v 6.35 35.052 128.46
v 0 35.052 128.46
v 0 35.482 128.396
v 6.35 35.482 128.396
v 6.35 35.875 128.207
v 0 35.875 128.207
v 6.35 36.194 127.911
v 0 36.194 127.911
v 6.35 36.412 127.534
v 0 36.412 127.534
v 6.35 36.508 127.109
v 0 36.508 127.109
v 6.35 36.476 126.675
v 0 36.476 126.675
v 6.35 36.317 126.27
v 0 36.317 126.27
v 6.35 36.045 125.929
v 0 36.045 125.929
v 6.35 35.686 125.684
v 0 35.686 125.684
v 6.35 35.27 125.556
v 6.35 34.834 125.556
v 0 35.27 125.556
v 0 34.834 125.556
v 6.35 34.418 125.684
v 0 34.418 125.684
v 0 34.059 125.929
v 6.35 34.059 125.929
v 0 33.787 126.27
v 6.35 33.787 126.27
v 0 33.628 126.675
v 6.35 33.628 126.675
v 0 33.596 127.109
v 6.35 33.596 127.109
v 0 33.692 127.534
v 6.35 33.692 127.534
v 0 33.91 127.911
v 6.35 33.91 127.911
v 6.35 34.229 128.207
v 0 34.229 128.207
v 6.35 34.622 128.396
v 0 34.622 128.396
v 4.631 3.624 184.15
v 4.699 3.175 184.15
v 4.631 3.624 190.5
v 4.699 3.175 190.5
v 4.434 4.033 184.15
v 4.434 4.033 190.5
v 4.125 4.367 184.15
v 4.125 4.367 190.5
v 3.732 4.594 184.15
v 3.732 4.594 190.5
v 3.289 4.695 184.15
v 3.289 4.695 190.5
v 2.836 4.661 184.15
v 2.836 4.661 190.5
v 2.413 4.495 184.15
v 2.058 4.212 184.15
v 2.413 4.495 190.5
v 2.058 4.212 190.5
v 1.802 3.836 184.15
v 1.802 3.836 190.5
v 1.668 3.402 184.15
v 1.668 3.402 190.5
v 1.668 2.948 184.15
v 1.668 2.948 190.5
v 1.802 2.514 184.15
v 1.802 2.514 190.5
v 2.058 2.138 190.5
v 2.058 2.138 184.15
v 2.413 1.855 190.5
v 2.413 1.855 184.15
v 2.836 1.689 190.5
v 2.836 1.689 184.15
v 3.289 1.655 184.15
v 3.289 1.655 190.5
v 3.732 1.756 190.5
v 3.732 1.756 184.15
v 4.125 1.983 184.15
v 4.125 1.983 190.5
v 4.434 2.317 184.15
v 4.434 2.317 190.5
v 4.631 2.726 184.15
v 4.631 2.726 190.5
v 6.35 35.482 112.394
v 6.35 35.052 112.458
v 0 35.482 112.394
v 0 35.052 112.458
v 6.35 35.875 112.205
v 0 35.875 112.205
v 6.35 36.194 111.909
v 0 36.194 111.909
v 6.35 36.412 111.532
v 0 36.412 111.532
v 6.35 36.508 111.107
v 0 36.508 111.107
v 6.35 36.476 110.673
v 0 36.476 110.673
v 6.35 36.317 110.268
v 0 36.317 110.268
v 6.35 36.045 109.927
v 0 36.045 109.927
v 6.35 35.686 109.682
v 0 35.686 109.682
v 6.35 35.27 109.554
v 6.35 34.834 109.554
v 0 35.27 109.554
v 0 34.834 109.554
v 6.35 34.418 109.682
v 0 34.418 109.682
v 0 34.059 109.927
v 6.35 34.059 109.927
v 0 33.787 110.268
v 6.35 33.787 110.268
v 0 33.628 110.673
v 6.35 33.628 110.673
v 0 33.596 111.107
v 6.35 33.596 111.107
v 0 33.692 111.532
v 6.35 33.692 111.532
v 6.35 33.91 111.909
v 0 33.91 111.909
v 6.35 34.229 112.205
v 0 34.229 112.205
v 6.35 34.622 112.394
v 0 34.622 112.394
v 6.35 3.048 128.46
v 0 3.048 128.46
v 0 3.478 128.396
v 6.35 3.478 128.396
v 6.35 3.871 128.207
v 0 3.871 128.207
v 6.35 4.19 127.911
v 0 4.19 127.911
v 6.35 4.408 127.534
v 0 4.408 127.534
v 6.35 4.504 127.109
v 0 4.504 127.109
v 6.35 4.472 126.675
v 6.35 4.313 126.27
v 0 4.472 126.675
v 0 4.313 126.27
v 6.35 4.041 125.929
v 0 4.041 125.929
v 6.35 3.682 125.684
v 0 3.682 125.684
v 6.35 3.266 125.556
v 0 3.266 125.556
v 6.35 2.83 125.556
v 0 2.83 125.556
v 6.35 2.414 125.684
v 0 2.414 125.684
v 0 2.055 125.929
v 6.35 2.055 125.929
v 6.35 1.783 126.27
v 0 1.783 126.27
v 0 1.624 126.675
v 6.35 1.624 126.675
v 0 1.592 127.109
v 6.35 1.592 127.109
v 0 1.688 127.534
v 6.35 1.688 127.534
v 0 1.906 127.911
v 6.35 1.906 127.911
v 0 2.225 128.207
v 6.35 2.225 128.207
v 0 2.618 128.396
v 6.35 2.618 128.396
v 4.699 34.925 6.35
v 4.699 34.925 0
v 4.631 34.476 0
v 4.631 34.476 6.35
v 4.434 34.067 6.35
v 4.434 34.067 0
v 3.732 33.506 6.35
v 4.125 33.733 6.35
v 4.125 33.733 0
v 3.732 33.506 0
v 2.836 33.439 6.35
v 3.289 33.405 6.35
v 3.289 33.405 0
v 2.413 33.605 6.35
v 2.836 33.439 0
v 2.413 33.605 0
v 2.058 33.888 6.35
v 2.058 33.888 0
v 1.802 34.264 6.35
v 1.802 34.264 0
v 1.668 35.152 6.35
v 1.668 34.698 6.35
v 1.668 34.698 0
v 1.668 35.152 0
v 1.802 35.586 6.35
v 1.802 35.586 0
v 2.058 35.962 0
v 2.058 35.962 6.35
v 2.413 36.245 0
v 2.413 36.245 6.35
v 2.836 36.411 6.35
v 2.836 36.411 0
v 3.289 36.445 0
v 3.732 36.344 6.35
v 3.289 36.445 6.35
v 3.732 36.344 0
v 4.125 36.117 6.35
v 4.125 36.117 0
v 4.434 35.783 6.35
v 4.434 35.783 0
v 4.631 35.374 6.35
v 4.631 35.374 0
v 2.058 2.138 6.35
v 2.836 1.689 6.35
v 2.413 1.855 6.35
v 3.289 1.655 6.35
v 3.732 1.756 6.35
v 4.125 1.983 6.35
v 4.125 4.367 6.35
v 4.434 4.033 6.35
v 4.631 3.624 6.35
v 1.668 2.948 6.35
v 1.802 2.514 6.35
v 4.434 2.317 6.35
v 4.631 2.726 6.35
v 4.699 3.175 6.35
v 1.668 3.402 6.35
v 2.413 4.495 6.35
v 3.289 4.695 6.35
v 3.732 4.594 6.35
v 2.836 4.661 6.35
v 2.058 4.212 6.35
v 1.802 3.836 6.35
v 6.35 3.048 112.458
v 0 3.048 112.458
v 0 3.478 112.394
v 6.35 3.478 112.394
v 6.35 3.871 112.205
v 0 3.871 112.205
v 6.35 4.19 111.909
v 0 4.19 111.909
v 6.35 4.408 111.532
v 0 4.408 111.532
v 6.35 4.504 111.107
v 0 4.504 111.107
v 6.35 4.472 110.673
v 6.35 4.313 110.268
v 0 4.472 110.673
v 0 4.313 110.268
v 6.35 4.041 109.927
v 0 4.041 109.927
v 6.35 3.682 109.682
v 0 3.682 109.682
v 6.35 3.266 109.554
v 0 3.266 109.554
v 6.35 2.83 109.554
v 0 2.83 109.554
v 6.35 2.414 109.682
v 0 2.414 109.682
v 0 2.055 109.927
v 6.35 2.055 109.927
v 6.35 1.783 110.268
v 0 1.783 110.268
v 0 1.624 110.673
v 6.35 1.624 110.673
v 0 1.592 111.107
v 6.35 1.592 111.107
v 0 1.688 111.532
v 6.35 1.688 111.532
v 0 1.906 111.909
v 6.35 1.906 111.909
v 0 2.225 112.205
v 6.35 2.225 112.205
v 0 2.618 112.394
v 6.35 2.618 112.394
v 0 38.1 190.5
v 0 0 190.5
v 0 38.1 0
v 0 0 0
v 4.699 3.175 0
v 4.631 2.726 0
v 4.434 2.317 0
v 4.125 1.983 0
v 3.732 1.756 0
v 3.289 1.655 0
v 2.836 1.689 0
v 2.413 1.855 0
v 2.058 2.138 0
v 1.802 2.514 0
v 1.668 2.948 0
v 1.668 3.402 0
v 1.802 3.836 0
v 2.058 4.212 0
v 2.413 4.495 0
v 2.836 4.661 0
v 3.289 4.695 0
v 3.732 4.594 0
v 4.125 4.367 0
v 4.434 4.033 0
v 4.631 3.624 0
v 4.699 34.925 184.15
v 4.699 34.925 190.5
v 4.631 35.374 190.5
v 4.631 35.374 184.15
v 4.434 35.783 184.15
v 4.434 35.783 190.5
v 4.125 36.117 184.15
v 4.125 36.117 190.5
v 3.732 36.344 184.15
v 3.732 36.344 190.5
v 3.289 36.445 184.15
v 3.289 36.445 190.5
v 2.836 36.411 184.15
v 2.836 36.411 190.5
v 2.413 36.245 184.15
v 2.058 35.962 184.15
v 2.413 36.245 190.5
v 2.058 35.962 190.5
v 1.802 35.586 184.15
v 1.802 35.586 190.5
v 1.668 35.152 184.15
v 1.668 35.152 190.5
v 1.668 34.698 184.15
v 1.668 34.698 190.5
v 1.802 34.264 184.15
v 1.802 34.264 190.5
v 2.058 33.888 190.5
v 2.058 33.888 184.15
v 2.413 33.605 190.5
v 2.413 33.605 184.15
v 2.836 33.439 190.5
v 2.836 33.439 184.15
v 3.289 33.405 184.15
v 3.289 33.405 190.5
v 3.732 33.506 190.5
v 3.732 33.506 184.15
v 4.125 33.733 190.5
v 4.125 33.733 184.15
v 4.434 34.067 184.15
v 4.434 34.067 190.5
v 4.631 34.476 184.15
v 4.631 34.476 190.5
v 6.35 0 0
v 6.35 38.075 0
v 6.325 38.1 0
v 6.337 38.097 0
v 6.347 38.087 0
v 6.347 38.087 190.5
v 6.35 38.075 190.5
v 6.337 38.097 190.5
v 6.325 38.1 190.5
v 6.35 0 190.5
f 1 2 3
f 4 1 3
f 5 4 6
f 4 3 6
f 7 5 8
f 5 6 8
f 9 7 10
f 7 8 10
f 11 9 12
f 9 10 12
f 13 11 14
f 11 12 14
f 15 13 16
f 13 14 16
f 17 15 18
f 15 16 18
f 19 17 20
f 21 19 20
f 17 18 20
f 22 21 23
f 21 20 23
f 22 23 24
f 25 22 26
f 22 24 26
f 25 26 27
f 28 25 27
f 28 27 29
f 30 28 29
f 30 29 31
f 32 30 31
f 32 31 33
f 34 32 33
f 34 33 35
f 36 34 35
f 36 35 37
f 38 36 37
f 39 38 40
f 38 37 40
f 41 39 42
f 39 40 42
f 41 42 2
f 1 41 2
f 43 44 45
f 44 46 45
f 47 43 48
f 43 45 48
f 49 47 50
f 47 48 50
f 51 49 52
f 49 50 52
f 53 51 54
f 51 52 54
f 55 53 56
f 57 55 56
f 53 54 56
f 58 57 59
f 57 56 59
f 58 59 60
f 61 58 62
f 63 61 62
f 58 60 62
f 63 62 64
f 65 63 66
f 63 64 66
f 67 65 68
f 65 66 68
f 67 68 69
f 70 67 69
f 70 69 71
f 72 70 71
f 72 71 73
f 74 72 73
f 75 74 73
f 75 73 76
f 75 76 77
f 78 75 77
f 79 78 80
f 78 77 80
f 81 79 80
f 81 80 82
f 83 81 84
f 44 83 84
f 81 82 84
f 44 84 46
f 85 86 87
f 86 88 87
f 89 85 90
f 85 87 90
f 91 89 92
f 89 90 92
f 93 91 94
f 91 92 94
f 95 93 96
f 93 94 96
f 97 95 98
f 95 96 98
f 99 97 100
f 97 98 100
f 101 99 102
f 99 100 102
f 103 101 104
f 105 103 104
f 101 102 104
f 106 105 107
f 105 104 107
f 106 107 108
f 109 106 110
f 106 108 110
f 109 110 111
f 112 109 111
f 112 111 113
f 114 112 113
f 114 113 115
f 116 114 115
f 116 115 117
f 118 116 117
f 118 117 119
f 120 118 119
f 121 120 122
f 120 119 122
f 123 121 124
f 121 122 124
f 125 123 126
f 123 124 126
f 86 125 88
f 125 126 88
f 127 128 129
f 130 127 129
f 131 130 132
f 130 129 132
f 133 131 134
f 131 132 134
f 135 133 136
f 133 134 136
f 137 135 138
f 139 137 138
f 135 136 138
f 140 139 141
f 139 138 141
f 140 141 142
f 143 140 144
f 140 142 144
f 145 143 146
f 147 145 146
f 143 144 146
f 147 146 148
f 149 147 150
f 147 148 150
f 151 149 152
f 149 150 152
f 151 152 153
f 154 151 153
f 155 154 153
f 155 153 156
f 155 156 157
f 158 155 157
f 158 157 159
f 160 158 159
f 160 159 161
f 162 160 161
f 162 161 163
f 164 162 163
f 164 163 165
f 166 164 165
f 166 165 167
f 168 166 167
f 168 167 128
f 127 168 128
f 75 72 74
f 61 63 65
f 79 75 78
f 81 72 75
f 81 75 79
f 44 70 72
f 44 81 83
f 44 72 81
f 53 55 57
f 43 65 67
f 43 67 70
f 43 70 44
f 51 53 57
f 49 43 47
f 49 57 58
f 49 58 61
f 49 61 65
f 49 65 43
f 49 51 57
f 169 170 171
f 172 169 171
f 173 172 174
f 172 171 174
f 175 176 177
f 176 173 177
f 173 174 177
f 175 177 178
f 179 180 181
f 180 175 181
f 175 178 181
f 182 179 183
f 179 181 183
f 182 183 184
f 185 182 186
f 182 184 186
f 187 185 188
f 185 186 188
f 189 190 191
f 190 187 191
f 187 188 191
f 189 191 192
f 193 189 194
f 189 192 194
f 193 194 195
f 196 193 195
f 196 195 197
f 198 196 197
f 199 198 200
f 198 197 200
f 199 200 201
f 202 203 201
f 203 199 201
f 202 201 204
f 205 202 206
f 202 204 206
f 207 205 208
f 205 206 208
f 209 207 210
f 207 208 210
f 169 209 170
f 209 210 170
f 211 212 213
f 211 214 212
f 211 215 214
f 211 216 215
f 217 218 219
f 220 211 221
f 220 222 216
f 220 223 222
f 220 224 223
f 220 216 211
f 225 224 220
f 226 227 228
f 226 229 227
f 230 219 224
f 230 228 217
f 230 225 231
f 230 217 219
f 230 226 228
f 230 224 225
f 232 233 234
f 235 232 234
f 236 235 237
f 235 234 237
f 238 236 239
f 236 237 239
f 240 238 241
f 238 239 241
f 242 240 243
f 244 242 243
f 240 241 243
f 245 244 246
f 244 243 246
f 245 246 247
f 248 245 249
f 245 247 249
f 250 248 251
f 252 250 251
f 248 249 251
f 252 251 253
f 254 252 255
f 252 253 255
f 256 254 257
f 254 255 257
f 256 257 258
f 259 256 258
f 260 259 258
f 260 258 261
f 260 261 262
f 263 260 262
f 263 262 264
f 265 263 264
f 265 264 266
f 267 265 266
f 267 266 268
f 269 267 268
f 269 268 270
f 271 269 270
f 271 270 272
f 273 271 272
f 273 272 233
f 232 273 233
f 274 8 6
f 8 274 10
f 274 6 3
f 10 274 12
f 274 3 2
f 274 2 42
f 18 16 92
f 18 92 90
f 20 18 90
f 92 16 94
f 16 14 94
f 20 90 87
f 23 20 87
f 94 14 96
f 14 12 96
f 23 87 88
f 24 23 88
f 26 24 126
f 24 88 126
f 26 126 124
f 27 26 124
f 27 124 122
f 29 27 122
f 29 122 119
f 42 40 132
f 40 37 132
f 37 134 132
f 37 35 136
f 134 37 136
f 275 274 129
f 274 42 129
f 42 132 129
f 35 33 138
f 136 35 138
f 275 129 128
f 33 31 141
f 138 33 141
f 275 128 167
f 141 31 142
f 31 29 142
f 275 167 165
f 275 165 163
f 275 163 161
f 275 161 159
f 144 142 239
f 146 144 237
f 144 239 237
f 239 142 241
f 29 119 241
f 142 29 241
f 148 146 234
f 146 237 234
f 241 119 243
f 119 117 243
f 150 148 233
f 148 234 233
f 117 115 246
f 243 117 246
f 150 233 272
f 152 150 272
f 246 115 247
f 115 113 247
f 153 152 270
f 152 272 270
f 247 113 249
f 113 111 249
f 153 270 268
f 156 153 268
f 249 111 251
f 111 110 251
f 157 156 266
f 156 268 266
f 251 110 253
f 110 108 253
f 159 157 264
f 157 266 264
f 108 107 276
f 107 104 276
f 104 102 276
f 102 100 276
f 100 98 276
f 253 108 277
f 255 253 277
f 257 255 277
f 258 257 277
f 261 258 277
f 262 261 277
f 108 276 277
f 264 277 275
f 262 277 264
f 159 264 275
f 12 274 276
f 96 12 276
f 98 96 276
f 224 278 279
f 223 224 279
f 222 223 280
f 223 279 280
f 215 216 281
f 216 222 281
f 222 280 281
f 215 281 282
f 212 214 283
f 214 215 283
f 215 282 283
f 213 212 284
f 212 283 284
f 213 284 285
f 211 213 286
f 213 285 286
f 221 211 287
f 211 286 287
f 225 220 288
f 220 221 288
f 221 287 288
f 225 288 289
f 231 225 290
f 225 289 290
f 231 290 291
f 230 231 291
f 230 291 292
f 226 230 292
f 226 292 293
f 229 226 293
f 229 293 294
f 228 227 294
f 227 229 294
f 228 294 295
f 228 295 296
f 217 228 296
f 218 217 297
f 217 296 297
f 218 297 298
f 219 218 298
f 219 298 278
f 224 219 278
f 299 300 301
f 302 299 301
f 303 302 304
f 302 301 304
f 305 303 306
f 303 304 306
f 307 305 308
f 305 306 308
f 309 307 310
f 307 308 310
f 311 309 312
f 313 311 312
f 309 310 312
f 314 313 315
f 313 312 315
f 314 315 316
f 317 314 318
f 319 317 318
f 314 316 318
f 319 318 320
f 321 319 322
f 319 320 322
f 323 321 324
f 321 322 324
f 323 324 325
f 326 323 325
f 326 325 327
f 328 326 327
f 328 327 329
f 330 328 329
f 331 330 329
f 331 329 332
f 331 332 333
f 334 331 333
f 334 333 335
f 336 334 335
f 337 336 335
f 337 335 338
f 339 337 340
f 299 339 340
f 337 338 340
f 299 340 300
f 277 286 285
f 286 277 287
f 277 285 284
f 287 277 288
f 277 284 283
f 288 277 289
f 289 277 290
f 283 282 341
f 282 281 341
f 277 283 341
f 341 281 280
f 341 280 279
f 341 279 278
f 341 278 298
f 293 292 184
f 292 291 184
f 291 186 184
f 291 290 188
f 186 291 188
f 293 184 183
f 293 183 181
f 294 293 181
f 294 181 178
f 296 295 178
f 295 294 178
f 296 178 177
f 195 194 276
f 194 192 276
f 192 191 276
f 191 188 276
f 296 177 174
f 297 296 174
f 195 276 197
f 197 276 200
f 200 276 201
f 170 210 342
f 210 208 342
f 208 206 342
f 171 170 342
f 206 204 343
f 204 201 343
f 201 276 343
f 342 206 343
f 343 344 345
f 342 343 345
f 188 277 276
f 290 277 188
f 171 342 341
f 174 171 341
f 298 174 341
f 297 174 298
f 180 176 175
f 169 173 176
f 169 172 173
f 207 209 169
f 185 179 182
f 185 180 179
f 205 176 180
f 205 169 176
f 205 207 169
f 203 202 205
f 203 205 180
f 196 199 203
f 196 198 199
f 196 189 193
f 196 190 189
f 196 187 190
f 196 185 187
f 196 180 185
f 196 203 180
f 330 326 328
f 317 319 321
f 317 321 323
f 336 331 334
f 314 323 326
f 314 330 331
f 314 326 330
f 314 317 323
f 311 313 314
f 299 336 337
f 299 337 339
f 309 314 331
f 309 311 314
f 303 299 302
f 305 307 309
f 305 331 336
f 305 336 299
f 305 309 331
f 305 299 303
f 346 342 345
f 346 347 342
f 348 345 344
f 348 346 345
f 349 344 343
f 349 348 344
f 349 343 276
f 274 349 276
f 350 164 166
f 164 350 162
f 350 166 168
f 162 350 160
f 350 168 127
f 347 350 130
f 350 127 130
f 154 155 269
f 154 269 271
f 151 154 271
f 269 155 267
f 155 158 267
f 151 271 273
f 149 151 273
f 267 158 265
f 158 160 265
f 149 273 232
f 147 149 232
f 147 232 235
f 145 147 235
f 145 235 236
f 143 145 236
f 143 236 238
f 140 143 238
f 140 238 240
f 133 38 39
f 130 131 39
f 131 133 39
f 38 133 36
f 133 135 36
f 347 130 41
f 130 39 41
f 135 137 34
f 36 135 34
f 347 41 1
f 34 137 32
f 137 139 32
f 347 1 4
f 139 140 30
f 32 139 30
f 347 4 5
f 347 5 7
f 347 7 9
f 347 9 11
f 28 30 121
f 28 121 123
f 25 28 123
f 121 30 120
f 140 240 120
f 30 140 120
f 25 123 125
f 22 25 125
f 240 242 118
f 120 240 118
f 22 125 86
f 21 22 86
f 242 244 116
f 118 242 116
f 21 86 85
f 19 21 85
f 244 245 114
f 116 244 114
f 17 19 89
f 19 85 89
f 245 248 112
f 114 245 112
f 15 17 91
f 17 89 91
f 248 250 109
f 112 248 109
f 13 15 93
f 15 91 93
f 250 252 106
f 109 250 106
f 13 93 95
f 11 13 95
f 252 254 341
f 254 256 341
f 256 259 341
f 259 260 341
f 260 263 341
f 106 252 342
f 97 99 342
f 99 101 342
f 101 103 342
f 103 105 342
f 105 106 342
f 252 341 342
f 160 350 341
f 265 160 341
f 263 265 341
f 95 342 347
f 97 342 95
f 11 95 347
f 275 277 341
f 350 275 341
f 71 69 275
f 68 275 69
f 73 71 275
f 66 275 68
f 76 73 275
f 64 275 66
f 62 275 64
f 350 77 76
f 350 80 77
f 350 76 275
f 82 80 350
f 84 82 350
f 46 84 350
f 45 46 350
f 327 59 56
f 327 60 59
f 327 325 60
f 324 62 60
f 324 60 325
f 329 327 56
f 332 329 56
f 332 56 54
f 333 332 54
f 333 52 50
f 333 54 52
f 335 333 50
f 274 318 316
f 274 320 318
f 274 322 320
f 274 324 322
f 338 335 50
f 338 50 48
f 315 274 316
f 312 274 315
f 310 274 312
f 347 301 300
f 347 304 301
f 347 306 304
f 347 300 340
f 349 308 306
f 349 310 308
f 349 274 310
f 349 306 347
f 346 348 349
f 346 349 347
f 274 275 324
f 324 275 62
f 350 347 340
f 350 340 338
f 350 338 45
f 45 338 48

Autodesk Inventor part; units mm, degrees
ref_plane "YZ Plane" through (0, 0, 0) normal (1, 0, 0) x (0, 1, 0)
sketch "Sketch1" plane through (0, 0, 0) normal (0, 0, 1) x (1, 0, 0)
  line L0 (0, 0) -> (6.35, 0)
  line L1 (6.35, 0) -> (6.35, 38.1)
  line L2 (6.35, 38.1) -> (0, 38.1)
  line L3 (0, 38.1) -> (0, 0)
  dimension "d0" = 6.35
  dimension "d1" = 38.1
extrude "Extrusion1" add sketch "Sketch1" along normal blind 190.5
sketch "Sketch2" plane through (0, 0, 190.5) normal (0, 0, 1) x (1, 0, 0)
  circle A0 centre (3.175, 3.175) radius 1.524
  circle A1 centre (3.175, 34.925) radius 1.524
  line L0 (0, 38.1) -> (0, 0) projected
  line L1 (6.35, 38.1) -> (0, 38.1) projected
  line L2 (6.35, 0) -> (6.35, 38.1) projected
  line L3 (0, 0) -> (6.35, 0) projected
  dimension "d4" = 3.048
  dimension "d5" = 3.048
  dimension "d6" = 3.175
  dimension "d7" = 3.175
  dimension "d8" = 3.175
  dimension "d9" = 3.175
extrude "Extrusion2" cut sketch "Sketch2" against normal blind 6.35 contours A0 | A1
ref_plane "Work Plane1" through (0, 0, 95.25) normal (0, 0, 1) x (1, 0, 0)
mirror "Mirror1" about plane through (0, 0, 95.25) normal (0, 0, 1) of "Extrusion2"
sketch "Sketch3" plane through (0, 0, 0) normal (-1, 0, 0) x (0, 0, 1)
  line L0 (0, 0) -> (190.5, 0) projected
  line L1 (190.5, 38.1) -> (190.5, 0) projected
  line L2 (0, 38.1) -> (0, 0) projected
  circle A0 centre (110.998, 3.048) radius 1.4605
  circle A1 centre (127, 3.048) radius 1.4605
  dimension "d12" = 3.048
  dimension "d13" = 3.048
  dimension "d14" = 16.002
  dimension "d15" = 63.5
  dimension "d16" = 110.998
  dimension "d17" = 2.921
  dimension "d18" = 2.921
extrude "Extrusion3" cut sketch "Sketch3" against normal through all
ref_plane "Work Plane2" through (0, 19.05, 0) normal (0, 1, 0) x (1, 0, 0)
mirror "Mirror2" about plane through (0, 19.05, 0) normal (0, 1, 0) of "Extrusion3"
fillet "Fillet1" radius 0.0254 1 edges at (6.35, 38.1, 95.25)
equation "\"d4\" = d5"
equation "\"d7\" = d6"
equation "\"d8\" = d6"
equation "\"d9\" = d6"
equation "\"d13\" = d12"
equation "\"d17\" = d18"
properties part number "Motor mount bar"
